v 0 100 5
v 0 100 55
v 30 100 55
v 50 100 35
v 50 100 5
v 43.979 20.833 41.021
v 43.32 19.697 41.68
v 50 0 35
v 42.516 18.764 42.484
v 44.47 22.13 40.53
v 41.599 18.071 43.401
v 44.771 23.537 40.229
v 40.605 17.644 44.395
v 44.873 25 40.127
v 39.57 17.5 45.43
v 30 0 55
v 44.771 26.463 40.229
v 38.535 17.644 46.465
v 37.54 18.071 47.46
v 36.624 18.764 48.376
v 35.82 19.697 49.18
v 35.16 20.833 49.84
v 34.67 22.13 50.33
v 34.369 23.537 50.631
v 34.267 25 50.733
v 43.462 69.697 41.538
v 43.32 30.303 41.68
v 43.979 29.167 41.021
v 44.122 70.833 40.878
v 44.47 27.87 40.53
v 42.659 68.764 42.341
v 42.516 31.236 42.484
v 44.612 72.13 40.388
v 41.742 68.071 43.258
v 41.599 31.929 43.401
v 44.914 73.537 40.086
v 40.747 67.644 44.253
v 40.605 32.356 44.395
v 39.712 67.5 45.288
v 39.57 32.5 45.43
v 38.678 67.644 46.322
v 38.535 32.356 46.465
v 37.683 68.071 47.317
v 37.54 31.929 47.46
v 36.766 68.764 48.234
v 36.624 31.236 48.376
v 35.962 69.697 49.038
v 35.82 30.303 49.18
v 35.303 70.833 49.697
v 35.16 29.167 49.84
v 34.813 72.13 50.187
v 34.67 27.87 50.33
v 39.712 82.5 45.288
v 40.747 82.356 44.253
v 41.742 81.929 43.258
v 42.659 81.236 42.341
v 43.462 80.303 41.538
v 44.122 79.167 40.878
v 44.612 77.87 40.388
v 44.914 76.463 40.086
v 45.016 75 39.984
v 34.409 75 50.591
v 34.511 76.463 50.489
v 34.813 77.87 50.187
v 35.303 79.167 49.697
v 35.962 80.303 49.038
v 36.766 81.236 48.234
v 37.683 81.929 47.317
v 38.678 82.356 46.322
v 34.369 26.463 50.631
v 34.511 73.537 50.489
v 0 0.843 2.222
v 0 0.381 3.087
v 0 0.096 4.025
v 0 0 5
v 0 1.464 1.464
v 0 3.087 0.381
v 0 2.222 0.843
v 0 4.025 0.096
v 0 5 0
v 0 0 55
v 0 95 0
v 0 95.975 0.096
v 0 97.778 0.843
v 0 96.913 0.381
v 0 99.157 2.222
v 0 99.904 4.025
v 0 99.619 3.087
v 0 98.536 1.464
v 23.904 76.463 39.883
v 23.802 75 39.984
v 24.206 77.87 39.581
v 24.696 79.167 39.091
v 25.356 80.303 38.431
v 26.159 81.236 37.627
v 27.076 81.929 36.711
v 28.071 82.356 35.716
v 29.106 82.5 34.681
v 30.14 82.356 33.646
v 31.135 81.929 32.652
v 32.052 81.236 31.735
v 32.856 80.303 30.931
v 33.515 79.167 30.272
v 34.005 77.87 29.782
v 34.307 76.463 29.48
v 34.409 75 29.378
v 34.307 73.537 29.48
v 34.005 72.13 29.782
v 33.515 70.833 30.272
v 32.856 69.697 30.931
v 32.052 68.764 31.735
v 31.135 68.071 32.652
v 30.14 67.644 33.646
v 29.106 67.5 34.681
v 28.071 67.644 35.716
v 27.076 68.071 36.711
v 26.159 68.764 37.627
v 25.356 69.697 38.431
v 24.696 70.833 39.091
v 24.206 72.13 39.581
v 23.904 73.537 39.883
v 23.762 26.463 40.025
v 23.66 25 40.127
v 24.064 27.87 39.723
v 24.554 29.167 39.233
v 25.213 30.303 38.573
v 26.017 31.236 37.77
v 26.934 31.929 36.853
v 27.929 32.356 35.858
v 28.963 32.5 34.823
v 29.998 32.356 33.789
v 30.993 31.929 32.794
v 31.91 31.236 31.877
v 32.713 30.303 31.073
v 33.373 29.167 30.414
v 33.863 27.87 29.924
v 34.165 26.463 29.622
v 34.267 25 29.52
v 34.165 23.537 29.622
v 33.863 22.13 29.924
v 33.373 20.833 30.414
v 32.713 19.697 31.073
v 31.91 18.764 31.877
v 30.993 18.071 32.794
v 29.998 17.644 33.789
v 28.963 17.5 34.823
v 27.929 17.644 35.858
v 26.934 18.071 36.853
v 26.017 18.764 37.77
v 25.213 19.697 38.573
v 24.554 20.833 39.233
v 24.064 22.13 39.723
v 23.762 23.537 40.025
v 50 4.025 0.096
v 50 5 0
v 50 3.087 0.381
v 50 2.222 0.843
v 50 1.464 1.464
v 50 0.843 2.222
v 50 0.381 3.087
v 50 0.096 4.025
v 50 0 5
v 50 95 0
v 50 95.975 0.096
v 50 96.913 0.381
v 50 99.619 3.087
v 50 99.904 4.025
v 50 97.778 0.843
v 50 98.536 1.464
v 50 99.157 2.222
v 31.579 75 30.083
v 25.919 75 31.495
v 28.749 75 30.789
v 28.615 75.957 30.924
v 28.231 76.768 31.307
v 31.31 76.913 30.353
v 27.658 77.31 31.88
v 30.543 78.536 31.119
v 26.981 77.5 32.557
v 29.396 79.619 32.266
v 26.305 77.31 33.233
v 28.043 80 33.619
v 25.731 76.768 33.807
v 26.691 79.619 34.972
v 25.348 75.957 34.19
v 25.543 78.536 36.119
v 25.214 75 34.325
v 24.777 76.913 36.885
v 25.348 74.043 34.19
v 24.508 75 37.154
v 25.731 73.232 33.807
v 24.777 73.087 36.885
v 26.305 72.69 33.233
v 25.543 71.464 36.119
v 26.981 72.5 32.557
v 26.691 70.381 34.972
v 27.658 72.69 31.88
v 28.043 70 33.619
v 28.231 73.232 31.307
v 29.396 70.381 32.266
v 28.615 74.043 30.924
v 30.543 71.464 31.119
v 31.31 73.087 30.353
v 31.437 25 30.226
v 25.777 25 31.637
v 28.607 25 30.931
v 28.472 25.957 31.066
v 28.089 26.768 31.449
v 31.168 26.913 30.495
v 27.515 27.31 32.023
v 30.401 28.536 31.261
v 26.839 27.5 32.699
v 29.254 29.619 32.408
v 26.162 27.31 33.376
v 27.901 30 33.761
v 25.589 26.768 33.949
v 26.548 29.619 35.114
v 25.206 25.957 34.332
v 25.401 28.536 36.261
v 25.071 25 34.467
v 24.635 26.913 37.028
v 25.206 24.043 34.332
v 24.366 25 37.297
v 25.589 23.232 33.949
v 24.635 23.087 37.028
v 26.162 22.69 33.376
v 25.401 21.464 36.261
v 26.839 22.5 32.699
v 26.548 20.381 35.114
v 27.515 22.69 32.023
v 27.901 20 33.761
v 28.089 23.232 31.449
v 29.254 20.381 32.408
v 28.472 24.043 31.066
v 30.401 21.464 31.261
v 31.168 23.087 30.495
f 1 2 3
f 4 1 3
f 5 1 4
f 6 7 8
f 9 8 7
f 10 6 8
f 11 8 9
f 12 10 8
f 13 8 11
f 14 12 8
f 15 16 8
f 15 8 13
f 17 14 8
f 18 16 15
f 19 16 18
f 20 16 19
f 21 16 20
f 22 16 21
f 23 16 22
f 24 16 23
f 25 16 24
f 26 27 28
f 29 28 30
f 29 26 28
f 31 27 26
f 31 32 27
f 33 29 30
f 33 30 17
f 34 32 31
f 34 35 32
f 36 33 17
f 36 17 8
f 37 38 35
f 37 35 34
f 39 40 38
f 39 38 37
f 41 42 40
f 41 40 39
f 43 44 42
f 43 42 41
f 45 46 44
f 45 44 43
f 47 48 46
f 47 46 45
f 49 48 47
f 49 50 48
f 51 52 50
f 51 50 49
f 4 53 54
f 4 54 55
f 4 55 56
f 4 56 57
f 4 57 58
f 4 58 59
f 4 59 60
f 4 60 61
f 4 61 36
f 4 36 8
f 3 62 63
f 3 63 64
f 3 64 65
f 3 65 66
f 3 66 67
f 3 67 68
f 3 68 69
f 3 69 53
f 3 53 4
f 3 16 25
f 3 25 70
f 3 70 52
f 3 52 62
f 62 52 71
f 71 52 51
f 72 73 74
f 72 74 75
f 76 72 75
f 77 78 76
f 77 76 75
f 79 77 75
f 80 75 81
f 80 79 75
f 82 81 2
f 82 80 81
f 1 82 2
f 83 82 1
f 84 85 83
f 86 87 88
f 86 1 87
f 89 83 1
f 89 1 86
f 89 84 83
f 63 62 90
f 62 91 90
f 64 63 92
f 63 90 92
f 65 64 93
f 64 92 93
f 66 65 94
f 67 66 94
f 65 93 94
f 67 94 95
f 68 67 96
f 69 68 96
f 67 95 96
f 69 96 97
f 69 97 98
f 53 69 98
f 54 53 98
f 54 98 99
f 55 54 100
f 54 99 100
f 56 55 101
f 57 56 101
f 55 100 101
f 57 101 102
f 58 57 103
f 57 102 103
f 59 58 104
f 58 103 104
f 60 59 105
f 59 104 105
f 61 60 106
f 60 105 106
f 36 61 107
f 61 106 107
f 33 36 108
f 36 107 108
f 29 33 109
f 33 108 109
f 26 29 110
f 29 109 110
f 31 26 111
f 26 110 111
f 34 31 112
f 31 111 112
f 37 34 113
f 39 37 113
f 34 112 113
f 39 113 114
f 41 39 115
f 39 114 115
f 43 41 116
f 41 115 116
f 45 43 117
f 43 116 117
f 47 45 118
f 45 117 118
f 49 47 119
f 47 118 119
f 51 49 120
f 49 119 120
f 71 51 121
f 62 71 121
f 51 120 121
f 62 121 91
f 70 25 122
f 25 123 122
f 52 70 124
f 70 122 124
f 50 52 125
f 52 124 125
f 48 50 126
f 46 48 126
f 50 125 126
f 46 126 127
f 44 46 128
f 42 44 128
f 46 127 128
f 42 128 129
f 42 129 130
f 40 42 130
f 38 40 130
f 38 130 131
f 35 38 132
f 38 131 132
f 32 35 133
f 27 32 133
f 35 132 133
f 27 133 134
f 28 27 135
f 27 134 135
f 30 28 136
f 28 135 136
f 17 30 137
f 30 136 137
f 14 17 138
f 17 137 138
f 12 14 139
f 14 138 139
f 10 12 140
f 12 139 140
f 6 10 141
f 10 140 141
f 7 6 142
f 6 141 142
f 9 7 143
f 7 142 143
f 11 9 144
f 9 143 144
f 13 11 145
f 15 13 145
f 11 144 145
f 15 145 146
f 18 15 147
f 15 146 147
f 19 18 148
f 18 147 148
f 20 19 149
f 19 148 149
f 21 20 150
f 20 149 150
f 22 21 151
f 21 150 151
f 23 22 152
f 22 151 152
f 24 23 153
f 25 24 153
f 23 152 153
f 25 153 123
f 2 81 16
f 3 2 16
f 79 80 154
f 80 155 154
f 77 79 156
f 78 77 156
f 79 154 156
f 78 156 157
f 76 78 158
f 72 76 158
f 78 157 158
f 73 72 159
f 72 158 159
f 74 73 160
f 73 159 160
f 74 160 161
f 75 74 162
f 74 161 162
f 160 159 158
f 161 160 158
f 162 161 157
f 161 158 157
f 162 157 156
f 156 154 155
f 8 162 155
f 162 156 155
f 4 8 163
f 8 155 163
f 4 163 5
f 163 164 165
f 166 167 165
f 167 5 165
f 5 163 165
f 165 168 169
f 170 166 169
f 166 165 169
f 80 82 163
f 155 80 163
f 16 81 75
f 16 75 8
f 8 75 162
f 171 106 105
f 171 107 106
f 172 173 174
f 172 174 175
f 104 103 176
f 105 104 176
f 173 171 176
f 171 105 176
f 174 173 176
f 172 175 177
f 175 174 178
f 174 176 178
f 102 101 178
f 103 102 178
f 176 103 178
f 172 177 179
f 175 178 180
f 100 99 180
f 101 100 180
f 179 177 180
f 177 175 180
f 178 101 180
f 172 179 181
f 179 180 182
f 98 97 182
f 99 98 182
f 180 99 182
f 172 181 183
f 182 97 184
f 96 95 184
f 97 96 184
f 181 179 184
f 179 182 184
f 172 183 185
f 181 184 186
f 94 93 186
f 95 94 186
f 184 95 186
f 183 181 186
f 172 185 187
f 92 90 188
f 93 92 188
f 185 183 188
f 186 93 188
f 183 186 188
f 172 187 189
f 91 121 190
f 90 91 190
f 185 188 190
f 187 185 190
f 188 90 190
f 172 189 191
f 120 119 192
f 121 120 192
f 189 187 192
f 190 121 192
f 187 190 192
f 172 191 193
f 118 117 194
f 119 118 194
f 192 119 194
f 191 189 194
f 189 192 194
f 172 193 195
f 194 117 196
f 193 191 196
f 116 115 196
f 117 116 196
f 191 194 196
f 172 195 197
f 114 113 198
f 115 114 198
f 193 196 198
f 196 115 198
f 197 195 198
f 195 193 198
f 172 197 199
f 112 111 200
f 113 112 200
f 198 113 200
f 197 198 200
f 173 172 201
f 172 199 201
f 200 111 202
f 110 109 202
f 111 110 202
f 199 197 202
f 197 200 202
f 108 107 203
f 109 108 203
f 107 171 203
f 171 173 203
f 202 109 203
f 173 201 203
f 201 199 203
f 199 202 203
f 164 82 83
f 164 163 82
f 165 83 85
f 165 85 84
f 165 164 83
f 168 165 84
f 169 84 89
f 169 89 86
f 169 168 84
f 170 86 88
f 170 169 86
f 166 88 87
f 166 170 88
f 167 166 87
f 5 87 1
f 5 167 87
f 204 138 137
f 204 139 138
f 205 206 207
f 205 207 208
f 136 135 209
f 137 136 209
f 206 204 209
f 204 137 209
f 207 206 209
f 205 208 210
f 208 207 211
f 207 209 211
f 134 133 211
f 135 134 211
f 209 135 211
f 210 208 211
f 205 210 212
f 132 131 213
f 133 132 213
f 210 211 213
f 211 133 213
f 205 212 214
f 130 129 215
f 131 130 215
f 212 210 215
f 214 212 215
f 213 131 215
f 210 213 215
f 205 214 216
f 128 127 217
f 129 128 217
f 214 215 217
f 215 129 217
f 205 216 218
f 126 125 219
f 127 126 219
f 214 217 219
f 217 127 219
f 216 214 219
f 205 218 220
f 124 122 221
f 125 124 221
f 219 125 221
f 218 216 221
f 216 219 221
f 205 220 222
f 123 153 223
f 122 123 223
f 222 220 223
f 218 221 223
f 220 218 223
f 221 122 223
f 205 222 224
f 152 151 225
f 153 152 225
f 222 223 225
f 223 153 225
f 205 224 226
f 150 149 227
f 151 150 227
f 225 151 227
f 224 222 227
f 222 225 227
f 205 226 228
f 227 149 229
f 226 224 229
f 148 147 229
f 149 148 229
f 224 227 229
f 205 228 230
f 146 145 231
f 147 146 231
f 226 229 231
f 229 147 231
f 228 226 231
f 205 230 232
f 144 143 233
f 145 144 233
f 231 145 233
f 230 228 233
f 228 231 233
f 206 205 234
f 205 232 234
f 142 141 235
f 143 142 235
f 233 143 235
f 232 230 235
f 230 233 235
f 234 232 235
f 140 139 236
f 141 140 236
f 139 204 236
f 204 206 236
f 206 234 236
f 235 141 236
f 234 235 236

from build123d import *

# Parameters (mm, degrees)
F0_W     = 50
F0_H     = 100
F1_DEPTH = 55
F2_SIZE  = 20
F4_D     = 15
F4_DEPTH = 15
F4_TIP   = 4.5064546427
F6_D     = 15
F6_DEPTH = 15
F6_TIP   = 4.5064546427
F8_R     = 5
F9_R     = 5


with BuildPart() as f1:
    # F0 (on Top) → F1 (new body)
    with BuildSketch(Plane.XY):
        with Locations((25, 50)):
            Rectangle(F0_W, F0_H)
    extrude(amount=F1_DEPTH)

    # F2
    f2_edges = [f1.edges().sort_by_distance(p)[0] for p in [
        (50, 50, 55),
    ]]
    chamfer(f2_edges, length=F2_SIZE)

    # F4
    with Locations(Plane(origin=(42.5, 0, 42.5), x_dir=(0.7071067812, 0, -0.7071067812), z_dir=(0.7071067812, 0, 0.7071067812))):
        with Locations((-4.1437726468, 25)):
            Hole(F4_D / 2, depth=F4_DEPTH)
            with Locations((0, 0, -(F4_DEPTH + F4_TIP / 2))):  # 118° drill point
                Cone(0, F4_D / 2, F4_TIP, mode=Mode.SUBTRACT)

    # F6
    with Locations(Plane(origin=(42.5, 0, 42.5), x_dir=(0.7071067812, 0, -0.7071067812), z_dir=(0.7071067812, 0, 0.7071067812))):
        with Locations((-3.94243747, 75)):
            Hole(F6_D / 2, depth=F6_DEPTH)
            with Locations((0, 0, -(F6_DEPTH + F6_TIP / 2))):  # 118° drill point
                Cone(0, F6_D / 2, F6_TIP, mode=Mode.SUBTRACT)

    # F8
    f8_edges = [f1.edges().sort_by_distance(p)[0] for p in [
        (25, 100, 0),
    ]]
    fillet(f8_edges, radius=F8_R)

    # F9
    f9_edges = [f1.edges().sort_by_distance(p)[0] for p in [
        (25, 0, 0),
    ]]
    fillet(f9_edges, radius=F9_R)


solid = f1.part
